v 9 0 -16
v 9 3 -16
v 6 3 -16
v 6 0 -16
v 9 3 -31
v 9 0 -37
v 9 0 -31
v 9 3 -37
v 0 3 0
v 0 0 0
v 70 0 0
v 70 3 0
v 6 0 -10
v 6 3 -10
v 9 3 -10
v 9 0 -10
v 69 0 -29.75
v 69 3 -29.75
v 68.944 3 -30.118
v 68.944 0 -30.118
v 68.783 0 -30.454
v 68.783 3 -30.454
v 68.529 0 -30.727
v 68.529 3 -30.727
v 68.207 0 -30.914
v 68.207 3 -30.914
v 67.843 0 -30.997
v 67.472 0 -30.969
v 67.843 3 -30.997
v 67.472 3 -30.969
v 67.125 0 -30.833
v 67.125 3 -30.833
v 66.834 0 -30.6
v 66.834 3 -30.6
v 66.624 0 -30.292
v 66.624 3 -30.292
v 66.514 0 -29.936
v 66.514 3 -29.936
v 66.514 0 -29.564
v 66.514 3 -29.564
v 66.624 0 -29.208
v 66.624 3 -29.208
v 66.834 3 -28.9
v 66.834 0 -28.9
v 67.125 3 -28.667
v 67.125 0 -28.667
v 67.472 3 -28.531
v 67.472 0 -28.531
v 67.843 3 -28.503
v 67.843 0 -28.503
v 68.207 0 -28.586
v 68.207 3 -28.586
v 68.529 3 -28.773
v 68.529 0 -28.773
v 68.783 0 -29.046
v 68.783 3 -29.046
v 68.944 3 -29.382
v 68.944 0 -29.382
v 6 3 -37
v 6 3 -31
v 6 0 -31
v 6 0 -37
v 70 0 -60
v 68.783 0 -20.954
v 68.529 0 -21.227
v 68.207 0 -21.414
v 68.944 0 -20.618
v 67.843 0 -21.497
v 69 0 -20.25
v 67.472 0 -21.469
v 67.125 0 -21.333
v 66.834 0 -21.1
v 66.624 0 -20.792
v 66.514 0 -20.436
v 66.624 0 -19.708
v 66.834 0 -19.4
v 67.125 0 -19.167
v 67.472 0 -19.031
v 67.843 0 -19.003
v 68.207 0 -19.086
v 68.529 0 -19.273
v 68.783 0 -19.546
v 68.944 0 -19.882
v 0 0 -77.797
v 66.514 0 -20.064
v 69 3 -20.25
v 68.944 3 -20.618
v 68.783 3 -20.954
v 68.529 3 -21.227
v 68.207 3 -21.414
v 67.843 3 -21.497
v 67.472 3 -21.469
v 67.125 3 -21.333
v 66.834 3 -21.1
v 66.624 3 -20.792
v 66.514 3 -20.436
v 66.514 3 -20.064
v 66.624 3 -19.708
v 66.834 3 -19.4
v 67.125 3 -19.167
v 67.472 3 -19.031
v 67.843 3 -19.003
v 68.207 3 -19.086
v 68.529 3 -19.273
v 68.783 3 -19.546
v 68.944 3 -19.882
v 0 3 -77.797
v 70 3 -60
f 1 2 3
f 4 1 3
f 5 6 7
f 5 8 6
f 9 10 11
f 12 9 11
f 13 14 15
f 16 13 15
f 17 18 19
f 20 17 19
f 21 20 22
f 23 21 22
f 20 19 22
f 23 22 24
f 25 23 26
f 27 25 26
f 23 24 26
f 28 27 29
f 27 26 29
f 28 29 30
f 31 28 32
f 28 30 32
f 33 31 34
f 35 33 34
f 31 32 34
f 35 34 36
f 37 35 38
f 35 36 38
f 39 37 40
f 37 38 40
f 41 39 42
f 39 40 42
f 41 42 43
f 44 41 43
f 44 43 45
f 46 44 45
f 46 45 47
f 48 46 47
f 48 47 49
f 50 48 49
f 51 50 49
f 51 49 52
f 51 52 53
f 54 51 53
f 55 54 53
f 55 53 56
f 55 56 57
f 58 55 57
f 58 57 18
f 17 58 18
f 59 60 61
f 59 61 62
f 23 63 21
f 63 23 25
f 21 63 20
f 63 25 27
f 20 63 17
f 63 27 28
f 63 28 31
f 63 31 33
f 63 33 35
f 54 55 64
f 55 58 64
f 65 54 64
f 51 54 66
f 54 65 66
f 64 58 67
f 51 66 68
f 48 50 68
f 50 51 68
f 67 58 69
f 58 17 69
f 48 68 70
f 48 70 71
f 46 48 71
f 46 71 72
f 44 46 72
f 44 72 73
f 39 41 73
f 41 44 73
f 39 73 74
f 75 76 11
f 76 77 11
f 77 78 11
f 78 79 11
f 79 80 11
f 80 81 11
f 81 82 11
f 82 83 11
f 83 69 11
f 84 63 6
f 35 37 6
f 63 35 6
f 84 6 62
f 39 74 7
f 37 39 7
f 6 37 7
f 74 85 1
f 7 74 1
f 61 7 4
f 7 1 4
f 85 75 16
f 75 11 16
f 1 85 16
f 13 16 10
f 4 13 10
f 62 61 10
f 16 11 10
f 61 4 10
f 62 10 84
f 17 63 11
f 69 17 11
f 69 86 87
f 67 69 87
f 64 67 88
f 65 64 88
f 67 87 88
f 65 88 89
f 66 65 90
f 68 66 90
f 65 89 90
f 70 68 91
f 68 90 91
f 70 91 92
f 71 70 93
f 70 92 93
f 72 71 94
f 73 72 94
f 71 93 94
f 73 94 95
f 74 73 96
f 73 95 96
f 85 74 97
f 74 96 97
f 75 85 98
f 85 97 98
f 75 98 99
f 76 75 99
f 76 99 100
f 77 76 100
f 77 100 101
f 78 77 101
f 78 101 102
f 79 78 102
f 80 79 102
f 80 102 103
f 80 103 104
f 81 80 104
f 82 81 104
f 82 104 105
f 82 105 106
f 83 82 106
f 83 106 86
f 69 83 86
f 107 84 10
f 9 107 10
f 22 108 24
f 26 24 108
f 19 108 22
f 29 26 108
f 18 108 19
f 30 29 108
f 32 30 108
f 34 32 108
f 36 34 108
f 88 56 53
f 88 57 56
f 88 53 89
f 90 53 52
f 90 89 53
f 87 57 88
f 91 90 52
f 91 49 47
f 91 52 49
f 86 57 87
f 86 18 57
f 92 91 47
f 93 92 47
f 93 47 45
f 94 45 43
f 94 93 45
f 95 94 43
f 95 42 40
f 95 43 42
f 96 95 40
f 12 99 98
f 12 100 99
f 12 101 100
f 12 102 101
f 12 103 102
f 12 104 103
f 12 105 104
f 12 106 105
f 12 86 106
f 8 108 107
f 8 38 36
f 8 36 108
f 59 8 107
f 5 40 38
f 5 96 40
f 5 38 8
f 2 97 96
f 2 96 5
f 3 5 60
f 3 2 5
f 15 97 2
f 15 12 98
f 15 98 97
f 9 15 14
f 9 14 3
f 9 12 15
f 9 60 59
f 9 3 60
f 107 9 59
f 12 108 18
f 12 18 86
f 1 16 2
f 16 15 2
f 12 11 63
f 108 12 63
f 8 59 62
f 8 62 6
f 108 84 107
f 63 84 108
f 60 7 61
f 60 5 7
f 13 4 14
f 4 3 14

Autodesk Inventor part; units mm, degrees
ref_plane "YZ Plane" through (0, 0, 0) normal (1, 0, 0) x (0, 1, 0)
ref_plane "XZ Plane" through (0, 0, 0) normal (0, 1, 0) x (-1, 0, 0)
ref_plane "XY Plane" through (0, 0, 0) normal (0, 0, 1) x (1, 0, 0)
sketch "Sketch1" plane through (0, 0, 0) normal (0, 1, 0) x (-1, 0, 0)
  line L0 (0, 0) -> (-70, 0)
  line L1 (-70, 0) -> (-70, -60)
  line L2 (-70, -60) -> (0, -60)
  line L3 (0, -60) -> (0, 0)
  line L4 (0, -60) -> (0, -77.7966)
  line L5 (0, -77.7966) -> (-70, -60)
  dimension "d0" = 70
  dimension "d1" = 60
  dimension "d23" = 14.264
extrude "Extrusion1" add sketch "Sketch1" along normal blind 3
sketch "Sketch3" plane through (0, 3, 0) normal (0, 1, 0) x (1, 0, 0)
  circle A0 centre (67.75, 20.25) radius 1.25
  circle A1 centre (67.75, 29.75) radius 1.25
  line L0 (70, 0) -> (70, 60) projected
  line L1 (0, 0) -> (70, 0) projected
  line L2 (6, 10) -> (9, 10)
  line L3 (9, 10) -> (9, 16)
  line L4 (9, 16) -> (6, 16)
  line L5 (6, 16) -> (6, 10)
  line L6 (6, 37) -> (9, 37)
  line L7 (9, 37) -> (9, 31)
  line L8 (9, 31) -> (6, 31)
  line L9 (6, 31) -> (6, 37)
  line L10 (0, 77.7966) -> (0, 0) projected
  dimension "d15" = 2.5
  dimension "d16" = 2.25
  dimension "d17" = 2.25
  dimension "d18" = 2.5
  dimension "d19" = 20.25
  dimension "d20" = 9.5
  dimension "d24" = 3
  dimension "d25" = 6
  dimension "d26" = 6
  dimension "d27" = 10
  dimension "d28" = 15
  dimension "d29" = 6
extrude "Extrusion3" cut sketch "Sketch3" along normal through all both and the other way through all
equation "\"d17\" = d16"
equation "\"d18\" = d15"
properties part number "pinball-case-left-wall-outer-scaled"
